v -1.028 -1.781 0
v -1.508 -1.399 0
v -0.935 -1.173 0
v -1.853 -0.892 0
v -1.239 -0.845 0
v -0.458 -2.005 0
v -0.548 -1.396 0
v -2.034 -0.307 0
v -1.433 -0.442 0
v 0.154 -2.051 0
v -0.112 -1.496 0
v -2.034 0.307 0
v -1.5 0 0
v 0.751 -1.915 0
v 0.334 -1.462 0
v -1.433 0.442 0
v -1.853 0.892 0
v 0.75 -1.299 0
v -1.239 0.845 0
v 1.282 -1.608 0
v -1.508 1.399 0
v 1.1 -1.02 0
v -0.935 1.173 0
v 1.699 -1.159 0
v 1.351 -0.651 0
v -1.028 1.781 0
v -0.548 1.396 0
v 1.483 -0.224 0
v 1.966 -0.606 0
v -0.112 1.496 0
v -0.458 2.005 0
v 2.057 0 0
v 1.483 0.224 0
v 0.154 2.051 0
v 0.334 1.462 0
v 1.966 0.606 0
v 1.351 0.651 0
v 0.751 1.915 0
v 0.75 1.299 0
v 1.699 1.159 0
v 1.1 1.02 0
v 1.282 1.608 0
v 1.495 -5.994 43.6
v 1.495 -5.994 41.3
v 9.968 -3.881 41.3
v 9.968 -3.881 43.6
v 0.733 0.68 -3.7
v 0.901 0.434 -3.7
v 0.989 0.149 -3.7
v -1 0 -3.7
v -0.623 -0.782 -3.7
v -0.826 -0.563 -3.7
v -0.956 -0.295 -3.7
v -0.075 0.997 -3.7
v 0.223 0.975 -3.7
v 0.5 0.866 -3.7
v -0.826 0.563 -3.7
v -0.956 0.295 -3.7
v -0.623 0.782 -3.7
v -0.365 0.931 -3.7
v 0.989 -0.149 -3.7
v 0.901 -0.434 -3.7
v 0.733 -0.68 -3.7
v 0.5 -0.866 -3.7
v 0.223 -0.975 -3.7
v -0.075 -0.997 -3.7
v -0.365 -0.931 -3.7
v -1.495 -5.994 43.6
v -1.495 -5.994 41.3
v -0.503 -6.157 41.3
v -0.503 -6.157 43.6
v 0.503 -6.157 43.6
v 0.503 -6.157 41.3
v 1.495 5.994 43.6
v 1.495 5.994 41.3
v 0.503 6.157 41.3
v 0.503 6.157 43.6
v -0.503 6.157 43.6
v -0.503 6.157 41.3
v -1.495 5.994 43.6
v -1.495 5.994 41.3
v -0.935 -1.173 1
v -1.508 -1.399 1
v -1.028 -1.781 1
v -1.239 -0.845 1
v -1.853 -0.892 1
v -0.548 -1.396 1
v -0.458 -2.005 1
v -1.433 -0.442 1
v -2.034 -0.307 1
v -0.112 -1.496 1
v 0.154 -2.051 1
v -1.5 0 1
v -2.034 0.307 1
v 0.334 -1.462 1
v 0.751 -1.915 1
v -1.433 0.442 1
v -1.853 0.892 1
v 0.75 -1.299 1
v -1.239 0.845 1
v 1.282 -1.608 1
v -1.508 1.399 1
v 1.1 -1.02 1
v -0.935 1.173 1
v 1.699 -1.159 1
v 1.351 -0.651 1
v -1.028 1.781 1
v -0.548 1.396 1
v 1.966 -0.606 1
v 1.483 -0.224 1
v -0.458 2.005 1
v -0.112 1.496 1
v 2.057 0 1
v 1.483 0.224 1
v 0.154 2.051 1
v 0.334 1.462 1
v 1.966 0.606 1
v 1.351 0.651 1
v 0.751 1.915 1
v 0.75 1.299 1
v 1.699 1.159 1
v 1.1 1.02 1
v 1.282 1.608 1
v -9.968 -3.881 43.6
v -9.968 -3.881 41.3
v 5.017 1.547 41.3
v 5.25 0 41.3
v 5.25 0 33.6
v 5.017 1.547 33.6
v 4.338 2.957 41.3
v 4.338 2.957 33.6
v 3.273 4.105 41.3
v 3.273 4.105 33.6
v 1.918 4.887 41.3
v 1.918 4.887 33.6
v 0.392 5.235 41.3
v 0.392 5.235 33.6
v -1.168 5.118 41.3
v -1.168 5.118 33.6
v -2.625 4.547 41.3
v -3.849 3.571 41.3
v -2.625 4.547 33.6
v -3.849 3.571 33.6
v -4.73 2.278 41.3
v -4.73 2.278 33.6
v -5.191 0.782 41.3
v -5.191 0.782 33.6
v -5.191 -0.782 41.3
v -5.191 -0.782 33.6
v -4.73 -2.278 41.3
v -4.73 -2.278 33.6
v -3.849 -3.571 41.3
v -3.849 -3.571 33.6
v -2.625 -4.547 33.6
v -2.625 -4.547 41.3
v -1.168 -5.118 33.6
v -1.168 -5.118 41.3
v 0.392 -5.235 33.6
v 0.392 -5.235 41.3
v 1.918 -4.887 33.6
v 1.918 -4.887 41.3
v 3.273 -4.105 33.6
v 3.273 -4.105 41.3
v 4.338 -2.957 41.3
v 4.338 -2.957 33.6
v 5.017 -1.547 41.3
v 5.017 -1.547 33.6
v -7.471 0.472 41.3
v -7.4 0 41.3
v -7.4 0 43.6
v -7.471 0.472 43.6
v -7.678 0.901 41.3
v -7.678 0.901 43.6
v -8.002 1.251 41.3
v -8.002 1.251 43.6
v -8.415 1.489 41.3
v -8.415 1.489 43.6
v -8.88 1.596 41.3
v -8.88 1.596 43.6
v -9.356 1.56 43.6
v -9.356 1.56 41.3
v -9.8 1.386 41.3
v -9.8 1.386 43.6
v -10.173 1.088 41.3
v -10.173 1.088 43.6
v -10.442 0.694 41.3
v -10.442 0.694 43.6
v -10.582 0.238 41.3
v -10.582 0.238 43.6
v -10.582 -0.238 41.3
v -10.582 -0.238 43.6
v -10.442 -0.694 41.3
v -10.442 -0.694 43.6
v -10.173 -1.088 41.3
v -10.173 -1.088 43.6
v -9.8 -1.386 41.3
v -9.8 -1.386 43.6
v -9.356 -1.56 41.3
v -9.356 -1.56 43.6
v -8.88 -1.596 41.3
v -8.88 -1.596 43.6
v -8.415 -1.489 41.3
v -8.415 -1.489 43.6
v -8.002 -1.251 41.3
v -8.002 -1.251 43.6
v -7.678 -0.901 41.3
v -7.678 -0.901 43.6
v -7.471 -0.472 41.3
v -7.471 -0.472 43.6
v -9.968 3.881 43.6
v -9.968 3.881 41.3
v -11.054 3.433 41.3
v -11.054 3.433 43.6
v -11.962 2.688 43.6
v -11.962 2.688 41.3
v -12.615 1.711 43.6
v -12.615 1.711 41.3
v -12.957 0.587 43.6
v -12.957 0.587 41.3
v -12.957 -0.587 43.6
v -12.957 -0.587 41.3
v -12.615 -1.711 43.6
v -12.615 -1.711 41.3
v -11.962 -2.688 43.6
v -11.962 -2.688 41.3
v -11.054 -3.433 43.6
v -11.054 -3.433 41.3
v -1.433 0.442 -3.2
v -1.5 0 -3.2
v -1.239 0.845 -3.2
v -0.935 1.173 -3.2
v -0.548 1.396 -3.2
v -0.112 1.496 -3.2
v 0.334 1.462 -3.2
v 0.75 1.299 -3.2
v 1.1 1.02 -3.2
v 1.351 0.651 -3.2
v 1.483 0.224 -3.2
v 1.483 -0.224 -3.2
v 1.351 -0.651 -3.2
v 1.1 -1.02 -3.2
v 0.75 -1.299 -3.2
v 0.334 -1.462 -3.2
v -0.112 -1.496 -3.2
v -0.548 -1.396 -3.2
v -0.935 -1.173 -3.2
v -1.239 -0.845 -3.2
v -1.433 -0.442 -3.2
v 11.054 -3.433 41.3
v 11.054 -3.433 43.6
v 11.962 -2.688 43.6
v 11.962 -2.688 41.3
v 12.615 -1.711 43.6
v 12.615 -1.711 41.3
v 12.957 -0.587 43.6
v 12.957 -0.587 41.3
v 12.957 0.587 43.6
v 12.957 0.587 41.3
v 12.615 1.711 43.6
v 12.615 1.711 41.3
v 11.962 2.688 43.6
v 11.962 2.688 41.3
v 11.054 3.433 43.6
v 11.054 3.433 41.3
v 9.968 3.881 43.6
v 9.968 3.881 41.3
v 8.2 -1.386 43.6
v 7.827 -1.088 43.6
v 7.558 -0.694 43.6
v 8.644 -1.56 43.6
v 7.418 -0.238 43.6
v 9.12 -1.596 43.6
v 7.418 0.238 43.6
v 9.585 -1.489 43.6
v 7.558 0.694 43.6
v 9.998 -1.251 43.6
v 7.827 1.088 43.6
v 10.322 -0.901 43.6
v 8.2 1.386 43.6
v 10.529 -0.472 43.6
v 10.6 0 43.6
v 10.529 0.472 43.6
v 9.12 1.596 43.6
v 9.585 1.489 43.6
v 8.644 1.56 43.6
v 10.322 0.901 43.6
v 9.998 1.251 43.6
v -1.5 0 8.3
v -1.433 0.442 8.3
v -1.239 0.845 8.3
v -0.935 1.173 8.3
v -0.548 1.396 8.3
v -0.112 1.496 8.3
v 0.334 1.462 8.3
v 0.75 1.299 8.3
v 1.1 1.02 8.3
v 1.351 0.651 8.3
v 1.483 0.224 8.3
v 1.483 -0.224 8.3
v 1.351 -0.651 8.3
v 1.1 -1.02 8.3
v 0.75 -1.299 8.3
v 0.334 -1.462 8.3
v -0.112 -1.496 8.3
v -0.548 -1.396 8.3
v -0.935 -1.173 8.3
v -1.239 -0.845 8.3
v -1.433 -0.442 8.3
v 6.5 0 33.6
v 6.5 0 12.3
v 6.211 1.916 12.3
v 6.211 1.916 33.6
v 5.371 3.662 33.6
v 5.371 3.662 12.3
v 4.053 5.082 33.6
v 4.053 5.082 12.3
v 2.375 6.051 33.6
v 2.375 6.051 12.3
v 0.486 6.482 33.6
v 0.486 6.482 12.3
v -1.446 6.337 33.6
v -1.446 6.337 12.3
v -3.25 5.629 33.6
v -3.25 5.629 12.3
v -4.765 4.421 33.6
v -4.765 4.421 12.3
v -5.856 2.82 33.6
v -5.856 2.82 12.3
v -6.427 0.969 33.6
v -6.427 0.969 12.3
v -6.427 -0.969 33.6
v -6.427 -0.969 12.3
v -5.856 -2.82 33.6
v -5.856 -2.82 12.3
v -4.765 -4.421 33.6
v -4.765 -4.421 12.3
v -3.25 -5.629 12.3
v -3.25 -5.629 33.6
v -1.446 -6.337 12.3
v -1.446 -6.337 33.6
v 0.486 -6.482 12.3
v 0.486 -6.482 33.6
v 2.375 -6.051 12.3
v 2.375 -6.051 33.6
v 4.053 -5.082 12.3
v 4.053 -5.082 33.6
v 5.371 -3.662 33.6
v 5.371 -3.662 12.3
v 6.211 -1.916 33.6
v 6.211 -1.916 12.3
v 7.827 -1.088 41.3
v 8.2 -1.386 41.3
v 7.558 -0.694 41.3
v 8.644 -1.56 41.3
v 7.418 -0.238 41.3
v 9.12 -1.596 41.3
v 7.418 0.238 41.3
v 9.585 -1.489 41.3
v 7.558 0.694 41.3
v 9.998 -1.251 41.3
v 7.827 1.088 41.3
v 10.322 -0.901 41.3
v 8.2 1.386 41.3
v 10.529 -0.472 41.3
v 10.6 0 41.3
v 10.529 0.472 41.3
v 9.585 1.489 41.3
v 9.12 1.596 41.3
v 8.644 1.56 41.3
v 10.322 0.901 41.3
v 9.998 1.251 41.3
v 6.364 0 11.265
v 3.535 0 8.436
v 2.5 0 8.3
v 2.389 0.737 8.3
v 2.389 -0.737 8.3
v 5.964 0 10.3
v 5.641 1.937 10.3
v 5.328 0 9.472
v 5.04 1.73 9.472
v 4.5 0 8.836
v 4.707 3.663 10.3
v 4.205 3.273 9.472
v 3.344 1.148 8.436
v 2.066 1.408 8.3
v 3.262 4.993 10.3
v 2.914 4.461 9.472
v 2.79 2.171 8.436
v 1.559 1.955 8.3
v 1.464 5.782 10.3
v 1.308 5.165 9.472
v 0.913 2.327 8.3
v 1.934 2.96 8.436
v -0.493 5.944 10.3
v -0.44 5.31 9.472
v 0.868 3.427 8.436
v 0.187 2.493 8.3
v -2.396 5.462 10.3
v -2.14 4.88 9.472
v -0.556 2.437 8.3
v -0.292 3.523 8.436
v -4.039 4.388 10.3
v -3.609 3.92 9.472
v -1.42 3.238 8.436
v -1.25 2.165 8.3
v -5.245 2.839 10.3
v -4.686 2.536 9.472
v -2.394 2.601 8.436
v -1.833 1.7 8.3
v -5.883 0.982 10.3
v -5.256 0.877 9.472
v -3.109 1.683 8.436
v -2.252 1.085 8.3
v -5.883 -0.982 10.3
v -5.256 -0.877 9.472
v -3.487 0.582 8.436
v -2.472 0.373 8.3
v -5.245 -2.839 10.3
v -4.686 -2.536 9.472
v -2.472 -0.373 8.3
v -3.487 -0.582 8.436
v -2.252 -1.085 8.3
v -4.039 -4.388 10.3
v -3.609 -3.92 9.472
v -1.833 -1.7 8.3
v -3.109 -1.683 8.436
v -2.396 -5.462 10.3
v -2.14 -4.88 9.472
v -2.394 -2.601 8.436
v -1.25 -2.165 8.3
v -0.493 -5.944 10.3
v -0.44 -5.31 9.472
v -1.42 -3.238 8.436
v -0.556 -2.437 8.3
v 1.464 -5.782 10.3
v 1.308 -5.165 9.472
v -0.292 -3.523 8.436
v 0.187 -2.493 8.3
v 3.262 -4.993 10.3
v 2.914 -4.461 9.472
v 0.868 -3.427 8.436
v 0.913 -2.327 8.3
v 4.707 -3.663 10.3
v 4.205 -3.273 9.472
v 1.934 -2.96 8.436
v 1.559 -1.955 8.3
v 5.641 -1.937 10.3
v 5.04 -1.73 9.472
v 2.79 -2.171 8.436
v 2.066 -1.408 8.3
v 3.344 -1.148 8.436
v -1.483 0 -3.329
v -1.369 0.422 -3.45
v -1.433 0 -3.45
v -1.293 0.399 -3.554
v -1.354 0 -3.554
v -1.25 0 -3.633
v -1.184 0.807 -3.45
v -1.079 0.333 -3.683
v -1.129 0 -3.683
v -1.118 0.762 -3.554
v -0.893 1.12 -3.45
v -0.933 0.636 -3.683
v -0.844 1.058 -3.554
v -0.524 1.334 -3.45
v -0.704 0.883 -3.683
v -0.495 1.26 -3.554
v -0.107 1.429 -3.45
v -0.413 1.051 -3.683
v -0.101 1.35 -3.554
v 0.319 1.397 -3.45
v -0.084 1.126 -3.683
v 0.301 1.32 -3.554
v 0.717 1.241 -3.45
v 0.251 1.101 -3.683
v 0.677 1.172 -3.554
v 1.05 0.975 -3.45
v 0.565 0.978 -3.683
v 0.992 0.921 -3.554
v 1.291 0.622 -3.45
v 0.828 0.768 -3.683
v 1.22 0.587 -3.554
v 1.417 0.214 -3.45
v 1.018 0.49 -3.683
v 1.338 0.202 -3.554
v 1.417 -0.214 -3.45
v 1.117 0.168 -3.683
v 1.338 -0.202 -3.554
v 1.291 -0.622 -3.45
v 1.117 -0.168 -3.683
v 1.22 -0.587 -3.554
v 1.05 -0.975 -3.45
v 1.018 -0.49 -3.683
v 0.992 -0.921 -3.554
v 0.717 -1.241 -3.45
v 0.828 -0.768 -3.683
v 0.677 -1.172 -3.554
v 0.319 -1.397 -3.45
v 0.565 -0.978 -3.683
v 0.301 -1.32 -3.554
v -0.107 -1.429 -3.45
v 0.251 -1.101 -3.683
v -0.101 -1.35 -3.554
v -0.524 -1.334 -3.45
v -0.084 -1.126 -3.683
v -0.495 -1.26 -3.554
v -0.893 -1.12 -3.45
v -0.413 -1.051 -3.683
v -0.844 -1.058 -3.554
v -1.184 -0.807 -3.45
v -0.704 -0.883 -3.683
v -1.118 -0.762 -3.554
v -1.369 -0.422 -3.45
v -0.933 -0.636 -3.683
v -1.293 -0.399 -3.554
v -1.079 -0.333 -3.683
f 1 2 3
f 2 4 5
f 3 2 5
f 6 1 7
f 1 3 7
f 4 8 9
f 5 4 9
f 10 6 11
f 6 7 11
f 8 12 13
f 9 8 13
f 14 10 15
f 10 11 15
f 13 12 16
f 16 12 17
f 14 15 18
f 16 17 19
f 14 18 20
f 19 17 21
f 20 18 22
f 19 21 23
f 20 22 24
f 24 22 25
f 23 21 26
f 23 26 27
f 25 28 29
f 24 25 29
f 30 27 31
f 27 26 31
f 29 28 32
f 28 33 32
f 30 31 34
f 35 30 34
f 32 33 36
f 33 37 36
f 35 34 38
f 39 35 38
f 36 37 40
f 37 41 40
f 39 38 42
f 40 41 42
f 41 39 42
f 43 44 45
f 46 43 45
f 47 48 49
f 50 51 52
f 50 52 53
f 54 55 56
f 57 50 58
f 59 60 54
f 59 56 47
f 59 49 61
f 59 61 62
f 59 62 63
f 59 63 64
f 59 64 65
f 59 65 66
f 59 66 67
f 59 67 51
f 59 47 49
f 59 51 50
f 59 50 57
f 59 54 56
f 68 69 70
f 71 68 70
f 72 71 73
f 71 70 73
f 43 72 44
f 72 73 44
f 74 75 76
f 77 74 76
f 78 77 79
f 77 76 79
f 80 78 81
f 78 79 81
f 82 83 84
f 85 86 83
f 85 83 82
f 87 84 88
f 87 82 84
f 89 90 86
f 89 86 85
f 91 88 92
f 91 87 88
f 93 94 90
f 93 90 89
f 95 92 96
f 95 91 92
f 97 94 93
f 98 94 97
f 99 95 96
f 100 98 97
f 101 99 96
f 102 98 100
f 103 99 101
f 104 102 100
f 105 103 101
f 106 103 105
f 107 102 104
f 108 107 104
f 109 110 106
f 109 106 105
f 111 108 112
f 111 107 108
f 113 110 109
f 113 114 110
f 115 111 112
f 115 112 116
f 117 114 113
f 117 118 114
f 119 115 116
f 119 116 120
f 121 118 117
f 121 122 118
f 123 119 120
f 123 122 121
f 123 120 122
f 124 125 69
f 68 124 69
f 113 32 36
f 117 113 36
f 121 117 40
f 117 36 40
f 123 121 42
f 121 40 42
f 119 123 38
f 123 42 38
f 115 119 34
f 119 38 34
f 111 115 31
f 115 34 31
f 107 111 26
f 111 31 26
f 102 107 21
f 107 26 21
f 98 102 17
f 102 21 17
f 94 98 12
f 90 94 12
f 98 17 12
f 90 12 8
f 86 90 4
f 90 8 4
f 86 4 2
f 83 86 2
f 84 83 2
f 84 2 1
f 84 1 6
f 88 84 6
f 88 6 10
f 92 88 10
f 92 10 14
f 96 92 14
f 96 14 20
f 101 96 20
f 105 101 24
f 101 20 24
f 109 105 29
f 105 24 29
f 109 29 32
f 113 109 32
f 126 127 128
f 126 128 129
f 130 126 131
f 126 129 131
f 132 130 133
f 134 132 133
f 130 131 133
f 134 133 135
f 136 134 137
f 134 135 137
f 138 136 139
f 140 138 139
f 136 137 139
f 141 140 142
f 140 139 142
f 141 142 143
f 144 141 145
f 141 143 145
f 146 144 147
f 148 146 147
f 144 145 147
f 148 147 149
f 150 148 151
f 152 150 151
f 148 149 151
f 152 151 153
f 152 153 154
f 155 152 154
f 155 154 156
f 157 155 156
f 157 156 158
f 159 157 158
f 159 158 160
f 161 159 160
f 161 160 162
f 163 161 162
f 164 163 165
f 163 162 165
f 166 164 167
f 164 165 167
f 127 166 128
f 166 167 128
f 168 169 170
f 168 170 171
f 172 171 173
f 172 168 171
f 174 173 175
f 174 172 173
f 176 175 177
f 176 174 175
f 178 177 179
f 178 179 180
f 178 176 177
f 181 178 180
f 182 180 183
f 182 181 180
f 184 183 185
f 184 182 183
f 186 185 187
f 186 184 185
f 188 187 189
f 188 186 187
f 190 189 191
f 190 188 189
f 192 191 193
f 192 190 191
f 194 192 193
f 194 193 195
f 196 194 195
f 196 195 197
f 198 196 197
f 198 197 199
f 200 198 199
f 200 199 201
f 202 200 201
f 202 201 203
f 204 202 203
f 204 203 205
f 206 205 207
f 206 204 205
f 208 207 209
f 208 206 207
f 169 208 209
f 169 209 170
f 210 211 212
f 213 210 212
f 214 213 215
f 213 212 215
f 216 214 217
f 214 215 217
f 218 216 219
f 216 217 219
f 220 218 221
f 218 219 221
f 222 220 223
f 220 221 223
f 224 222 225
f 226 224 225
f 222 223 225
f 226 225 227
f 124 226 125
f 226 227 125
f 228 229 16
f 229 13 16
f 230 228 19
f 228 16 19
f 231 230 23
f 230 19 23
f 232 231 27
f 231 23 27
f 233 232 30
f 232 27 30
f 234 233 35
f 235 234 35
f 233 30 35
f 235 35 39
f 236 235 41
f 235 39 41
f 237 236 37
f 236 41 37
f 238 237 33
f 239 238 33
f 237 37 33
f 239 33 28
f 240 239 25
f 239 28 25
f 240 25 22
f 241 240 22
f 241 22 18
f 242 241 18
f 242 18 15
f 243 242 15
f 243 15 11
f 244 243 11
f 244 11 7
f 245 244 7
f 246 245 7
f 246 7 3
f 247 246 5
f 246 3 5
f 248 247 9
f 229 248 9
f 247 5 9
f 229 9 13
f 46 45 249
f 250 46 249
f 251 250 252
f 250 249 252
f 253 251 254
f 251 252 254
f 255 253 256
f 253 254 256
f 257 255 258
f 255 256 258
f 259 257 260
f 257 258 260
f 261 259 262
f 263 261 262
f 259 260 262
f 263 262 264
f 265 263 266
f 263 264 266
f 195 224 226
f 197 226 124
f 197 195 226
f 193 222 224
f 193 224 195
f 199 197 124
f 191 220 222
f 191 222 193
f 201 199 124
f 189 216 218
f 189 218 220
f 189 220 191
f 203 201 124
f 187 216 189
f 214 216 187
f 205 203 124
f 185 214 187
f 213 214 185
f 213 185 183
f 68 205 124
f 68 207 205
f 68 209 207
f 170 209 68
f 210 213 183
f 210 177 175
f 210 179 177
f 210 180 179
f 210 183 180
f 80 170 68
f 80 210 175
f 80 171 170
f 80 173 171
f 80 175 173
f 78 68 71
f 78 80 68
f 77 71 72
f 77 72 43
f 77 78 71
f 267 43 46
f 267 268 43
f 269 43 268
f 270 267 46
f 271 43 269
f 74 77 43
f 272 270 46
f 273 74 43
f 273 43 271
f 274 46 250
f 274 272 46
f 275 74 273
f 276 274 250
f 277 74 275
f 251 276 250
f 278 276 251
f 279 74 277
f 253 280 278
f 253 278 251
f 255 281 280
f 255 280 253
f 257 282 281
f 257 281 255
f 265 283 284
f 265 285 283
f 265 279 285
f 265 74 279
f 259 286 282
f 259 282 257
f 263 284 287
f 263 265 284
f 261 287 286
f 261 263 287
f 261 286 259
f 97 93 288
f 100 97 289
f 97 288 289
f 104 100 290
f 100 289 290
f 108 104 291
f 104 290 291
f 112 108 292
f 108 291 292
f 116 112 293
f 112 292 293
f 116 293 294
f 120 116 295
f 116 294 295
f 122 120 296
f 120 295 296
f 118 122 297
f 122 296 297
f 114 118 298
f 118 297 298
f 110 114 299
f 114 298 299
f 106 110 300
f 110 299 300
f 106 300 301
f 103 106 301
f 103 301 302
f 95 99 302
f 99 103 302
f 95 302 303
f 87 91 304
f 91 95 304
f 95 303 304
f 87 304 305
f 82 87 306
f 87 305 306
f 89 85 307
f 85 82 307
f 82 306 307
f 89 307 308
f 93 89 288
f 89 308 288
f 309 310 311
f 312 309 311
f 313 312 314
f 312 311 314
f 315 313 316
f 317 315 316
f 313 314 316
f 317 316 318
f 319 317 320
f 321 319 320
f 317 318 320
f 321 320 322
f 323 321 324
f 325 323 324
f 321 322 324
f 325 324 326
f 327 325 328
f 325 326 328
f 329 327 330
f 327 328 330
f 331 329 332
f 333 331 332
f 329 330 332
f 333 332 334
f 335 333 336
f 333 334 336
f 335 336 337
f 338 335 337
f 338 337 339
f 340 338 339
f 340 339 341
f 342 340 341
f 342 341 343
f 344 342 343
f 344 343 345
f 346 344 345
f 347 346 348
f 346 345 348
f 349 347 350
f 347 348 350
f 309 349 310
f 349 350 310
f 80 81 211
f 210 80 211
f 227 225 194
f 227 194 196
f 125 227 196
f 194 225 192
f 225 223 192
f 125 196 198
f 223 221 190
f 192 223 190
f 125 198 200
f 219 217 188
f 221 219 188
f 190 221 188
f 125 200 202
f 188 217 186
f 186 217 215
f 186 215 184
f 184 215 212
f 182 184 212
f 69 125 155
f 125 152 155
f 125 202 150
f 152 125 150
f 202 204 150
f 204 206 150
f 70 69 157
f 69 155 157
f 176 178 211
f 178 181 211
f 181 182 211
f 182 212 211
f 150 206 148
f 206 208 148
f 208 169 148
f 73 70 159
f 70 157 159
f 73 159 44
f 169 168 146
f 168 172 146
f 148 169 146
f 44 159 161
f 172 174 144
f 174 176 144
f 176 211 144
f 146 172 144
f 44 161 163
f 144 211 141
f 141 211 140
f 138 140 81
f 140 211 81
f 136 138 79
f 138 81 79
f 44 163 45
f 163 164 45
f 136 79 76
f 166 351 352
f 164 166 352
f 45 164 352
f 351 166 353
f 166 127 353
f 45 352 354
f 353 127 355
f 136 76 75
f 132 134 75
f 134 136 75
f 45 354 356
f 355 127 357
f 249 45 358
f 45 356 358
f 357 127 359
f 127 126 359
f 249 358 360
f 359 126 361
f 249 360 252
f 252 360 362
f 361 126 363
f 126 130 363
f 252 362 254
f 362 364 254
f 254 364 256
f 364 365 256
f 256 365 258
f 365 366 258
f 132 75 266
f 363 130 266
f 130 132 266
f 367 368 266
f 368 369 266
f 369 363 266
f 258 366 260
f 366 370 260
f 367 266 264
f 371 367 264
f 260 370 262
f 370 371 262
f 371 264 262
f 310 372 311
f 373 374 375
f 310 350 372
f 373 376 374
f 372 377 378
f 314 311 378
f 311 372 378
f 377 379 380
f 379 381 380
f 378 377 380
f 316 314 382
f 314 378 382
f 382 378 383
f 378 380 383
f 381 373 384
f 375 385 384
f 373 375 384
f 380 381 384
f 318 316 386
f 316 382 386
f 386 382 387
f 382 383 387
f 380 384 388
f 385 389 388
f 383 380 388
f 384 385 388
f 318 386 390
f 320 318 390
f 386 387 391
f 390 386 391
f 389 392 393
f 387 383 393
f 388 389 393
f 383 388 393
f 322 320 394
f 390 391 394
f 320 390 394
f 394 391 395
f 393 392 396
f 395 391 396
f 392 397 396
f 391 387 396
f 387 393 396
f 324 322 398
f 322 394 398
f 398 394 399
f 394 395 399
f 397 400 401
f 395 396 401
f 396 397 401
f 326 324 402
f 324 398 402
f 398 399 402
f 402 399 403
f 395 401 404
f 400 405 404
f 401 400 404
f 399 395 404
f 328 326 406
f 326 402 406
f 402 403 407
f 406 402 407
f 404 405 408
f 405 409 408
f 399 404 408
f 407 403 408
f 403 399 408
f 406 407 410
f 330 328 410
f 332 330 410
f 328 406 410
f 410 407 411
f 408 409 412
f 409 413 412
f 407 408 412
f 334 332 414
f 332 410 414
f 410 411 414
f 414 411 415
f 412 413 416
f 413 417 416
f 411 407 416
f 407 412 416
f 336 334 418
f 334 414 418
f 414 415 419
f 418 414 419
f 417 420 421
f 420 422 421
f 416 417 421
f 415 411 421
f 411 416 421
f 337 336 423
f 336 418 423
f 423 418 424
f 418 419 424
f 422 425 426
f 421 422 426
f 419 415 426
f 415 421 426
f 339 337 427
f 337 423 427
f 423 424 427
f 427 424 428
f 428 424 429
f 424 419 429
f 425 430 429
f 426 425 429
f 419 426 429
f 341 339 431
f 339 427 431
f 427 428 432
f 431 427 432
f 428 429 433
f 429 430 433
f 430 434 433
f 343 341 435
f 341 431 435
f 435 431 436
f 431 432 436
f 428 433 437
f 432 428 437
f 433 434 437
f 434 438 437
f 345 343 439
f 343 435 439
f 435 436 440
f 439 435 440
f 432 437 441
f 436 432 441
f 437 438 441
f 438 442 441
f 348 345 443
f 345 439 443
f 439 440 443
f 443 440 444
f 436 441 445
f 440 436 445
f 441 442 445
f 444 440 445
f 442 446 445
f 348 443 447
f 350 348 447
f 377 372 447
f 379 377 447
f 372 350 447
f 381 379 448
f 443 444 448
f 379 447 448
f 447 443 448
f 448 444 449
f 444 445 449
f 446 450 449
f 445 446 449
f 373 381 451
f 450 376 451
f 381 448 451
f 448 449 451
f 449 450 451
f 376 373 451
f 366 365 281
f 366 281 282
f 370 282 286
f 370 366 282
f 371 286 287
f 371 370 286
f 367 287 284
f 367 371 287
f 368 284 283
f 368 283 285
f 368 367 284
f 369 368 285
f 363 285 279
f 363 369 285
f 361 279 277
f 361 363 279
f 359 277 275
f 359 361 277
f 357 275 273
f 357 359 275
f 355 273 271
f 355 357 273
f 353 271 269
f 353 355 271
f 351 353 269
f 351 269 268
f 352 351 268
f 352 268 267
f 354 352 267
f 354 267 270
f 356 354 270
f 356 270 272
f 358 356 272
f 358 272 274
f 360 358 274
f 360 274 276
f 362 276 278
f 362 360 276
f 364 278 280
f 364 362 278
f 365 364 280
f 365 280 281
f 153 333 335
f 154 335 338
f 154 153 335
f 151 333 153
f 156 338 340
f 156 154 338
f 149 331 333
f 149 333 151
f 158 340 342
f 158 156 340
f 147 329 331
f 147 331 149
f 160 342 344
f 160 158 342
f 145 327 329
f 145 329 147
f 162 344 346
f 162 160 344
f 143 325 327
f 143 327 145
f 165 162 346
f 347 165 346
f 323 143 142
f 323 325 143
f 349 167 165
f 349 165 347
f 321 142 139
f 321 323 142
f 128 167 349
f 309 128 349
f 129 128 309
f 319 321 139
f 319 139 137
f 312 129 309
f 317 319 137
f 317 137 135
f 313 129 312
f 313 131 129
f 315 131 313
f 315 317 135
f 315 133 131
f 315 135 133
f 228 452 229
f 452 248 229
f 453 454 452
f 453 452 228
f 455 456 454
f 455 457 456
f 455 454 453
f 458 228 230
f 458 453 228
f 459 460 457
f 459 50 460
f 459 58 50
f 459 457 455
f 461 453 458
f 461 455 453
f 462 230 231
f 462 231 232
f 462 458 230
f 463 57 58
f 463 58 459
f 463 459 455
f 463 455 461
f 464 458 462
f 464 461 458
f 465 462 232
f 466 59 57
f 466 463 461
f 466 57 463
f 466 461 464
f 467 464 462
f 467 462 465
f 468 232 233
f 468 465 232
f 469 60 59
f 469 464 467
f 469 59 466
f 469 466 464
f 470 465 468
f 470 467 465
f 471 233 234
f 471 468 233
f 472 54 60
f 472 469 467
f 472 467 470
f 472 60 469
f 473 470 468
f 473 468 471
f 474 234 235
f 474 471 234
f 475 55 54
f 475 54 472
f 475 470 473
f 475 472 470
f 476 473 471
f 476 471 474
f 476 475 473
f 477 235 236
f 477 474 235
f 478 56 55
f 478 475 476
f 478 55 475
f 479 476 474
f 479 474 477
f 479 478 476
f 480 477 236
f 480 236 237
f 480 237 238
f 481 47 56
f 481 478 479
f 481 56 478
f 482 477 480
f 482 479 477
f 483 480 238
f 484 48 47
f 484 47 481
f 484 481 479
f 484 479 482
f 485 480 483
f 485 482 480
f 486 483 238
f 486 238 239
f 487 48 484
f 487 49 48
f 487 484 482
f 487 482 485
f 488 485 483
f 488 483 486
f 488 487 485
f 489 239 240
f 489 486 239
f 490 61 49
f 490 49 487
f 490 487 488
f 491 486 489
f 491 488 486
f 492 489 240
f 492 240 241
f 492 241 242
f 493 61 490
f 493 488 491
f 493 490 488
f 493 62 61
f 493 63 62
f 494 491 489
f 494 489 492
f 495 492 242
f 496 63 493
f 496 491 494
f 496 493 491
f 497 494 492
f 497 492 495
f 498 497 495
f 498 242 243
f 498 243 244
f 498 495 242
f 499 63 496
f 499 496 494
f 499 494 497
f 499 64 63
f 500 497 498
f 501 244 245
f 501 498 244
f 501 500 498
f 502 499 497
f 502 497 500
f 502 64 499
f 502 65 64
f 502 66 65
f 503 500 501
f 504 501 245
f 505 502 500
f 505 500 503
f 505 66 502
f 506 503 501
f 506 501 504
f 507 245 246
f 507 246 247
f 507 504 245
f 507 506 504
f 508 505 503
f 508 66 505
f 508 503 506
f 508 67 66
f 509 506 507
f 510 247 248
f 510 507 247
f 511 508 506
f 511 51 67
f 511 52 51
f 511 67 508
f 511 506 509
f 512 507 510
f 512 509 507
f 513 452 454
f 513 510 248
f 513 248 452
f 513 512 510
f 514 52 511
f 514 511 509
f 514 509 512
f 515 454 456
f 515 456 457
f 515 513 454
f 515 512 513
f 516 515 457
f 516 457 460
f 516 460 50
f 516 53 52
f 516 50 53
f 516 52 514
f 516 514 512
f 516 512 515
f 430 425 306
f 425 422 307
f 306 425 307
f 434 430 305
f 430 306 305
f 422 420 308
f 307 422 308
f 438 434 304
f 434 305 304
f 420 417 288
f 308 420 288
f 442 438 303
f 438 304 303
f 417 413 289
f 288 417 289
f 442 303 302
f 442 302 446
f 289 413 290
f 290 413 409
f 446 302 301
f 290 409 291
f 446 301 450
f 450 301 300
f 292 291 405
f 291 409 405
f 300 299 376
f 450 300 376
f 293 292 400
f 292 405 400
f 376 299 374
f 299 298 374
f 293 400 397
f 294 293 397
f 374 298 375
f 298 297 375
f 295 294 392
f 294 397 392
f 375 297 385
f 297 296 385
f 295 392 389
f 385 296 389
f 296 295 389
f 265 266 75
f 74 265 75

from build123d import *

# Parameters (mm, degrees)
F0_W      = 1.5
F0_H      = 12
F2_R      = 6.5
F3_DEPTH  = 25.3
F4_R      = 5.25
F5_DEPTH  = 7.7
F6_R      = 1.6
F7_DEPTH  = 2.3
F8_R      = 4
F9_R      = 0.5
F10_R     = 2.056885
F11_DEPTH = 1


with BuildPart() as f1:
    # F0 (on Front) → F1 (revolve)
    with BuildSketch(Plane.XZ):
        with Locations((-0.75, 2.3)):
            Rectangle(F0_W, F0_H)
    revolve(axis=Axis((0, 0, -10.260424), (0, 0, -1)))

    # F2 (on face) → F3 (join)
    with BuildSketch(Plane.XY.offset(8.3)):
        Circle(F2_R)
    extrude(amount=F3_DEPTH)

    # F4 (on face) → F5 (join)
    with BuildSketch(Plane.XY.offset(33.6)):
        Circle(F4_R)
    extrude(amount=F5_DEPTH)

    # F6 (on face) → F7 (join)
    with BuildSketch(Plane.XY.offset(41.3)):
        with BuildLine():
            Line((-1.494822, 5.994148), (-9.967878, 3.881135))
            ThreePointArc((-9.967878, 3.881135), (-13, 0), (-9.967878, -3.881135))
            Line((-9.967878, -3.881135), (-1.494822, -5.994148))
            ThreePointArc((-1.494822, -5.994148), (0, -6.177726), (1.494822, -5.994148))
            Line((1.494822, -5.994148), (9.967878, -3.881135))
            ThreePointArc((9.967878, -3.881135), (13, 0), (9.967878, 3.881135))
            Line((9.967878, 3.881135), (1.494822, 5.994148))
            ThreePointArc((1.494822, 5.994148), (0, 6.177726), (-1.494822, 5.994148))
        make_face()
        with Locations((-9, 0)):
            Circle(F6_R, mode=Mode.SUBTRACT)
        with Locations((9, 0)):
            Circle(F6_R, mode=Mode.SUBTRACT)
    extrude(amount=F7_DEPTH)

    # F8
    f8_edges = [f1.edges().sort_by_distance(p)[0] for p in [
        (-6.5, 0, 8.3),
    ]]
    fillet(f8_edges, radius=F8_R)

    # F9
    f9_edges = [f1.edges().sort_by_distance(p)[0] for p in [
        (1.5, 0, -3.7),
    ]]
    fillet(f9_edges, radius=F9_R)

    # F10 (on Top) → F11 (join)
    with BuildSketch(Plane.XY):
        Circle(F10_R)
    extrude(amount=F11_DEPTH)


solid = f1.part
